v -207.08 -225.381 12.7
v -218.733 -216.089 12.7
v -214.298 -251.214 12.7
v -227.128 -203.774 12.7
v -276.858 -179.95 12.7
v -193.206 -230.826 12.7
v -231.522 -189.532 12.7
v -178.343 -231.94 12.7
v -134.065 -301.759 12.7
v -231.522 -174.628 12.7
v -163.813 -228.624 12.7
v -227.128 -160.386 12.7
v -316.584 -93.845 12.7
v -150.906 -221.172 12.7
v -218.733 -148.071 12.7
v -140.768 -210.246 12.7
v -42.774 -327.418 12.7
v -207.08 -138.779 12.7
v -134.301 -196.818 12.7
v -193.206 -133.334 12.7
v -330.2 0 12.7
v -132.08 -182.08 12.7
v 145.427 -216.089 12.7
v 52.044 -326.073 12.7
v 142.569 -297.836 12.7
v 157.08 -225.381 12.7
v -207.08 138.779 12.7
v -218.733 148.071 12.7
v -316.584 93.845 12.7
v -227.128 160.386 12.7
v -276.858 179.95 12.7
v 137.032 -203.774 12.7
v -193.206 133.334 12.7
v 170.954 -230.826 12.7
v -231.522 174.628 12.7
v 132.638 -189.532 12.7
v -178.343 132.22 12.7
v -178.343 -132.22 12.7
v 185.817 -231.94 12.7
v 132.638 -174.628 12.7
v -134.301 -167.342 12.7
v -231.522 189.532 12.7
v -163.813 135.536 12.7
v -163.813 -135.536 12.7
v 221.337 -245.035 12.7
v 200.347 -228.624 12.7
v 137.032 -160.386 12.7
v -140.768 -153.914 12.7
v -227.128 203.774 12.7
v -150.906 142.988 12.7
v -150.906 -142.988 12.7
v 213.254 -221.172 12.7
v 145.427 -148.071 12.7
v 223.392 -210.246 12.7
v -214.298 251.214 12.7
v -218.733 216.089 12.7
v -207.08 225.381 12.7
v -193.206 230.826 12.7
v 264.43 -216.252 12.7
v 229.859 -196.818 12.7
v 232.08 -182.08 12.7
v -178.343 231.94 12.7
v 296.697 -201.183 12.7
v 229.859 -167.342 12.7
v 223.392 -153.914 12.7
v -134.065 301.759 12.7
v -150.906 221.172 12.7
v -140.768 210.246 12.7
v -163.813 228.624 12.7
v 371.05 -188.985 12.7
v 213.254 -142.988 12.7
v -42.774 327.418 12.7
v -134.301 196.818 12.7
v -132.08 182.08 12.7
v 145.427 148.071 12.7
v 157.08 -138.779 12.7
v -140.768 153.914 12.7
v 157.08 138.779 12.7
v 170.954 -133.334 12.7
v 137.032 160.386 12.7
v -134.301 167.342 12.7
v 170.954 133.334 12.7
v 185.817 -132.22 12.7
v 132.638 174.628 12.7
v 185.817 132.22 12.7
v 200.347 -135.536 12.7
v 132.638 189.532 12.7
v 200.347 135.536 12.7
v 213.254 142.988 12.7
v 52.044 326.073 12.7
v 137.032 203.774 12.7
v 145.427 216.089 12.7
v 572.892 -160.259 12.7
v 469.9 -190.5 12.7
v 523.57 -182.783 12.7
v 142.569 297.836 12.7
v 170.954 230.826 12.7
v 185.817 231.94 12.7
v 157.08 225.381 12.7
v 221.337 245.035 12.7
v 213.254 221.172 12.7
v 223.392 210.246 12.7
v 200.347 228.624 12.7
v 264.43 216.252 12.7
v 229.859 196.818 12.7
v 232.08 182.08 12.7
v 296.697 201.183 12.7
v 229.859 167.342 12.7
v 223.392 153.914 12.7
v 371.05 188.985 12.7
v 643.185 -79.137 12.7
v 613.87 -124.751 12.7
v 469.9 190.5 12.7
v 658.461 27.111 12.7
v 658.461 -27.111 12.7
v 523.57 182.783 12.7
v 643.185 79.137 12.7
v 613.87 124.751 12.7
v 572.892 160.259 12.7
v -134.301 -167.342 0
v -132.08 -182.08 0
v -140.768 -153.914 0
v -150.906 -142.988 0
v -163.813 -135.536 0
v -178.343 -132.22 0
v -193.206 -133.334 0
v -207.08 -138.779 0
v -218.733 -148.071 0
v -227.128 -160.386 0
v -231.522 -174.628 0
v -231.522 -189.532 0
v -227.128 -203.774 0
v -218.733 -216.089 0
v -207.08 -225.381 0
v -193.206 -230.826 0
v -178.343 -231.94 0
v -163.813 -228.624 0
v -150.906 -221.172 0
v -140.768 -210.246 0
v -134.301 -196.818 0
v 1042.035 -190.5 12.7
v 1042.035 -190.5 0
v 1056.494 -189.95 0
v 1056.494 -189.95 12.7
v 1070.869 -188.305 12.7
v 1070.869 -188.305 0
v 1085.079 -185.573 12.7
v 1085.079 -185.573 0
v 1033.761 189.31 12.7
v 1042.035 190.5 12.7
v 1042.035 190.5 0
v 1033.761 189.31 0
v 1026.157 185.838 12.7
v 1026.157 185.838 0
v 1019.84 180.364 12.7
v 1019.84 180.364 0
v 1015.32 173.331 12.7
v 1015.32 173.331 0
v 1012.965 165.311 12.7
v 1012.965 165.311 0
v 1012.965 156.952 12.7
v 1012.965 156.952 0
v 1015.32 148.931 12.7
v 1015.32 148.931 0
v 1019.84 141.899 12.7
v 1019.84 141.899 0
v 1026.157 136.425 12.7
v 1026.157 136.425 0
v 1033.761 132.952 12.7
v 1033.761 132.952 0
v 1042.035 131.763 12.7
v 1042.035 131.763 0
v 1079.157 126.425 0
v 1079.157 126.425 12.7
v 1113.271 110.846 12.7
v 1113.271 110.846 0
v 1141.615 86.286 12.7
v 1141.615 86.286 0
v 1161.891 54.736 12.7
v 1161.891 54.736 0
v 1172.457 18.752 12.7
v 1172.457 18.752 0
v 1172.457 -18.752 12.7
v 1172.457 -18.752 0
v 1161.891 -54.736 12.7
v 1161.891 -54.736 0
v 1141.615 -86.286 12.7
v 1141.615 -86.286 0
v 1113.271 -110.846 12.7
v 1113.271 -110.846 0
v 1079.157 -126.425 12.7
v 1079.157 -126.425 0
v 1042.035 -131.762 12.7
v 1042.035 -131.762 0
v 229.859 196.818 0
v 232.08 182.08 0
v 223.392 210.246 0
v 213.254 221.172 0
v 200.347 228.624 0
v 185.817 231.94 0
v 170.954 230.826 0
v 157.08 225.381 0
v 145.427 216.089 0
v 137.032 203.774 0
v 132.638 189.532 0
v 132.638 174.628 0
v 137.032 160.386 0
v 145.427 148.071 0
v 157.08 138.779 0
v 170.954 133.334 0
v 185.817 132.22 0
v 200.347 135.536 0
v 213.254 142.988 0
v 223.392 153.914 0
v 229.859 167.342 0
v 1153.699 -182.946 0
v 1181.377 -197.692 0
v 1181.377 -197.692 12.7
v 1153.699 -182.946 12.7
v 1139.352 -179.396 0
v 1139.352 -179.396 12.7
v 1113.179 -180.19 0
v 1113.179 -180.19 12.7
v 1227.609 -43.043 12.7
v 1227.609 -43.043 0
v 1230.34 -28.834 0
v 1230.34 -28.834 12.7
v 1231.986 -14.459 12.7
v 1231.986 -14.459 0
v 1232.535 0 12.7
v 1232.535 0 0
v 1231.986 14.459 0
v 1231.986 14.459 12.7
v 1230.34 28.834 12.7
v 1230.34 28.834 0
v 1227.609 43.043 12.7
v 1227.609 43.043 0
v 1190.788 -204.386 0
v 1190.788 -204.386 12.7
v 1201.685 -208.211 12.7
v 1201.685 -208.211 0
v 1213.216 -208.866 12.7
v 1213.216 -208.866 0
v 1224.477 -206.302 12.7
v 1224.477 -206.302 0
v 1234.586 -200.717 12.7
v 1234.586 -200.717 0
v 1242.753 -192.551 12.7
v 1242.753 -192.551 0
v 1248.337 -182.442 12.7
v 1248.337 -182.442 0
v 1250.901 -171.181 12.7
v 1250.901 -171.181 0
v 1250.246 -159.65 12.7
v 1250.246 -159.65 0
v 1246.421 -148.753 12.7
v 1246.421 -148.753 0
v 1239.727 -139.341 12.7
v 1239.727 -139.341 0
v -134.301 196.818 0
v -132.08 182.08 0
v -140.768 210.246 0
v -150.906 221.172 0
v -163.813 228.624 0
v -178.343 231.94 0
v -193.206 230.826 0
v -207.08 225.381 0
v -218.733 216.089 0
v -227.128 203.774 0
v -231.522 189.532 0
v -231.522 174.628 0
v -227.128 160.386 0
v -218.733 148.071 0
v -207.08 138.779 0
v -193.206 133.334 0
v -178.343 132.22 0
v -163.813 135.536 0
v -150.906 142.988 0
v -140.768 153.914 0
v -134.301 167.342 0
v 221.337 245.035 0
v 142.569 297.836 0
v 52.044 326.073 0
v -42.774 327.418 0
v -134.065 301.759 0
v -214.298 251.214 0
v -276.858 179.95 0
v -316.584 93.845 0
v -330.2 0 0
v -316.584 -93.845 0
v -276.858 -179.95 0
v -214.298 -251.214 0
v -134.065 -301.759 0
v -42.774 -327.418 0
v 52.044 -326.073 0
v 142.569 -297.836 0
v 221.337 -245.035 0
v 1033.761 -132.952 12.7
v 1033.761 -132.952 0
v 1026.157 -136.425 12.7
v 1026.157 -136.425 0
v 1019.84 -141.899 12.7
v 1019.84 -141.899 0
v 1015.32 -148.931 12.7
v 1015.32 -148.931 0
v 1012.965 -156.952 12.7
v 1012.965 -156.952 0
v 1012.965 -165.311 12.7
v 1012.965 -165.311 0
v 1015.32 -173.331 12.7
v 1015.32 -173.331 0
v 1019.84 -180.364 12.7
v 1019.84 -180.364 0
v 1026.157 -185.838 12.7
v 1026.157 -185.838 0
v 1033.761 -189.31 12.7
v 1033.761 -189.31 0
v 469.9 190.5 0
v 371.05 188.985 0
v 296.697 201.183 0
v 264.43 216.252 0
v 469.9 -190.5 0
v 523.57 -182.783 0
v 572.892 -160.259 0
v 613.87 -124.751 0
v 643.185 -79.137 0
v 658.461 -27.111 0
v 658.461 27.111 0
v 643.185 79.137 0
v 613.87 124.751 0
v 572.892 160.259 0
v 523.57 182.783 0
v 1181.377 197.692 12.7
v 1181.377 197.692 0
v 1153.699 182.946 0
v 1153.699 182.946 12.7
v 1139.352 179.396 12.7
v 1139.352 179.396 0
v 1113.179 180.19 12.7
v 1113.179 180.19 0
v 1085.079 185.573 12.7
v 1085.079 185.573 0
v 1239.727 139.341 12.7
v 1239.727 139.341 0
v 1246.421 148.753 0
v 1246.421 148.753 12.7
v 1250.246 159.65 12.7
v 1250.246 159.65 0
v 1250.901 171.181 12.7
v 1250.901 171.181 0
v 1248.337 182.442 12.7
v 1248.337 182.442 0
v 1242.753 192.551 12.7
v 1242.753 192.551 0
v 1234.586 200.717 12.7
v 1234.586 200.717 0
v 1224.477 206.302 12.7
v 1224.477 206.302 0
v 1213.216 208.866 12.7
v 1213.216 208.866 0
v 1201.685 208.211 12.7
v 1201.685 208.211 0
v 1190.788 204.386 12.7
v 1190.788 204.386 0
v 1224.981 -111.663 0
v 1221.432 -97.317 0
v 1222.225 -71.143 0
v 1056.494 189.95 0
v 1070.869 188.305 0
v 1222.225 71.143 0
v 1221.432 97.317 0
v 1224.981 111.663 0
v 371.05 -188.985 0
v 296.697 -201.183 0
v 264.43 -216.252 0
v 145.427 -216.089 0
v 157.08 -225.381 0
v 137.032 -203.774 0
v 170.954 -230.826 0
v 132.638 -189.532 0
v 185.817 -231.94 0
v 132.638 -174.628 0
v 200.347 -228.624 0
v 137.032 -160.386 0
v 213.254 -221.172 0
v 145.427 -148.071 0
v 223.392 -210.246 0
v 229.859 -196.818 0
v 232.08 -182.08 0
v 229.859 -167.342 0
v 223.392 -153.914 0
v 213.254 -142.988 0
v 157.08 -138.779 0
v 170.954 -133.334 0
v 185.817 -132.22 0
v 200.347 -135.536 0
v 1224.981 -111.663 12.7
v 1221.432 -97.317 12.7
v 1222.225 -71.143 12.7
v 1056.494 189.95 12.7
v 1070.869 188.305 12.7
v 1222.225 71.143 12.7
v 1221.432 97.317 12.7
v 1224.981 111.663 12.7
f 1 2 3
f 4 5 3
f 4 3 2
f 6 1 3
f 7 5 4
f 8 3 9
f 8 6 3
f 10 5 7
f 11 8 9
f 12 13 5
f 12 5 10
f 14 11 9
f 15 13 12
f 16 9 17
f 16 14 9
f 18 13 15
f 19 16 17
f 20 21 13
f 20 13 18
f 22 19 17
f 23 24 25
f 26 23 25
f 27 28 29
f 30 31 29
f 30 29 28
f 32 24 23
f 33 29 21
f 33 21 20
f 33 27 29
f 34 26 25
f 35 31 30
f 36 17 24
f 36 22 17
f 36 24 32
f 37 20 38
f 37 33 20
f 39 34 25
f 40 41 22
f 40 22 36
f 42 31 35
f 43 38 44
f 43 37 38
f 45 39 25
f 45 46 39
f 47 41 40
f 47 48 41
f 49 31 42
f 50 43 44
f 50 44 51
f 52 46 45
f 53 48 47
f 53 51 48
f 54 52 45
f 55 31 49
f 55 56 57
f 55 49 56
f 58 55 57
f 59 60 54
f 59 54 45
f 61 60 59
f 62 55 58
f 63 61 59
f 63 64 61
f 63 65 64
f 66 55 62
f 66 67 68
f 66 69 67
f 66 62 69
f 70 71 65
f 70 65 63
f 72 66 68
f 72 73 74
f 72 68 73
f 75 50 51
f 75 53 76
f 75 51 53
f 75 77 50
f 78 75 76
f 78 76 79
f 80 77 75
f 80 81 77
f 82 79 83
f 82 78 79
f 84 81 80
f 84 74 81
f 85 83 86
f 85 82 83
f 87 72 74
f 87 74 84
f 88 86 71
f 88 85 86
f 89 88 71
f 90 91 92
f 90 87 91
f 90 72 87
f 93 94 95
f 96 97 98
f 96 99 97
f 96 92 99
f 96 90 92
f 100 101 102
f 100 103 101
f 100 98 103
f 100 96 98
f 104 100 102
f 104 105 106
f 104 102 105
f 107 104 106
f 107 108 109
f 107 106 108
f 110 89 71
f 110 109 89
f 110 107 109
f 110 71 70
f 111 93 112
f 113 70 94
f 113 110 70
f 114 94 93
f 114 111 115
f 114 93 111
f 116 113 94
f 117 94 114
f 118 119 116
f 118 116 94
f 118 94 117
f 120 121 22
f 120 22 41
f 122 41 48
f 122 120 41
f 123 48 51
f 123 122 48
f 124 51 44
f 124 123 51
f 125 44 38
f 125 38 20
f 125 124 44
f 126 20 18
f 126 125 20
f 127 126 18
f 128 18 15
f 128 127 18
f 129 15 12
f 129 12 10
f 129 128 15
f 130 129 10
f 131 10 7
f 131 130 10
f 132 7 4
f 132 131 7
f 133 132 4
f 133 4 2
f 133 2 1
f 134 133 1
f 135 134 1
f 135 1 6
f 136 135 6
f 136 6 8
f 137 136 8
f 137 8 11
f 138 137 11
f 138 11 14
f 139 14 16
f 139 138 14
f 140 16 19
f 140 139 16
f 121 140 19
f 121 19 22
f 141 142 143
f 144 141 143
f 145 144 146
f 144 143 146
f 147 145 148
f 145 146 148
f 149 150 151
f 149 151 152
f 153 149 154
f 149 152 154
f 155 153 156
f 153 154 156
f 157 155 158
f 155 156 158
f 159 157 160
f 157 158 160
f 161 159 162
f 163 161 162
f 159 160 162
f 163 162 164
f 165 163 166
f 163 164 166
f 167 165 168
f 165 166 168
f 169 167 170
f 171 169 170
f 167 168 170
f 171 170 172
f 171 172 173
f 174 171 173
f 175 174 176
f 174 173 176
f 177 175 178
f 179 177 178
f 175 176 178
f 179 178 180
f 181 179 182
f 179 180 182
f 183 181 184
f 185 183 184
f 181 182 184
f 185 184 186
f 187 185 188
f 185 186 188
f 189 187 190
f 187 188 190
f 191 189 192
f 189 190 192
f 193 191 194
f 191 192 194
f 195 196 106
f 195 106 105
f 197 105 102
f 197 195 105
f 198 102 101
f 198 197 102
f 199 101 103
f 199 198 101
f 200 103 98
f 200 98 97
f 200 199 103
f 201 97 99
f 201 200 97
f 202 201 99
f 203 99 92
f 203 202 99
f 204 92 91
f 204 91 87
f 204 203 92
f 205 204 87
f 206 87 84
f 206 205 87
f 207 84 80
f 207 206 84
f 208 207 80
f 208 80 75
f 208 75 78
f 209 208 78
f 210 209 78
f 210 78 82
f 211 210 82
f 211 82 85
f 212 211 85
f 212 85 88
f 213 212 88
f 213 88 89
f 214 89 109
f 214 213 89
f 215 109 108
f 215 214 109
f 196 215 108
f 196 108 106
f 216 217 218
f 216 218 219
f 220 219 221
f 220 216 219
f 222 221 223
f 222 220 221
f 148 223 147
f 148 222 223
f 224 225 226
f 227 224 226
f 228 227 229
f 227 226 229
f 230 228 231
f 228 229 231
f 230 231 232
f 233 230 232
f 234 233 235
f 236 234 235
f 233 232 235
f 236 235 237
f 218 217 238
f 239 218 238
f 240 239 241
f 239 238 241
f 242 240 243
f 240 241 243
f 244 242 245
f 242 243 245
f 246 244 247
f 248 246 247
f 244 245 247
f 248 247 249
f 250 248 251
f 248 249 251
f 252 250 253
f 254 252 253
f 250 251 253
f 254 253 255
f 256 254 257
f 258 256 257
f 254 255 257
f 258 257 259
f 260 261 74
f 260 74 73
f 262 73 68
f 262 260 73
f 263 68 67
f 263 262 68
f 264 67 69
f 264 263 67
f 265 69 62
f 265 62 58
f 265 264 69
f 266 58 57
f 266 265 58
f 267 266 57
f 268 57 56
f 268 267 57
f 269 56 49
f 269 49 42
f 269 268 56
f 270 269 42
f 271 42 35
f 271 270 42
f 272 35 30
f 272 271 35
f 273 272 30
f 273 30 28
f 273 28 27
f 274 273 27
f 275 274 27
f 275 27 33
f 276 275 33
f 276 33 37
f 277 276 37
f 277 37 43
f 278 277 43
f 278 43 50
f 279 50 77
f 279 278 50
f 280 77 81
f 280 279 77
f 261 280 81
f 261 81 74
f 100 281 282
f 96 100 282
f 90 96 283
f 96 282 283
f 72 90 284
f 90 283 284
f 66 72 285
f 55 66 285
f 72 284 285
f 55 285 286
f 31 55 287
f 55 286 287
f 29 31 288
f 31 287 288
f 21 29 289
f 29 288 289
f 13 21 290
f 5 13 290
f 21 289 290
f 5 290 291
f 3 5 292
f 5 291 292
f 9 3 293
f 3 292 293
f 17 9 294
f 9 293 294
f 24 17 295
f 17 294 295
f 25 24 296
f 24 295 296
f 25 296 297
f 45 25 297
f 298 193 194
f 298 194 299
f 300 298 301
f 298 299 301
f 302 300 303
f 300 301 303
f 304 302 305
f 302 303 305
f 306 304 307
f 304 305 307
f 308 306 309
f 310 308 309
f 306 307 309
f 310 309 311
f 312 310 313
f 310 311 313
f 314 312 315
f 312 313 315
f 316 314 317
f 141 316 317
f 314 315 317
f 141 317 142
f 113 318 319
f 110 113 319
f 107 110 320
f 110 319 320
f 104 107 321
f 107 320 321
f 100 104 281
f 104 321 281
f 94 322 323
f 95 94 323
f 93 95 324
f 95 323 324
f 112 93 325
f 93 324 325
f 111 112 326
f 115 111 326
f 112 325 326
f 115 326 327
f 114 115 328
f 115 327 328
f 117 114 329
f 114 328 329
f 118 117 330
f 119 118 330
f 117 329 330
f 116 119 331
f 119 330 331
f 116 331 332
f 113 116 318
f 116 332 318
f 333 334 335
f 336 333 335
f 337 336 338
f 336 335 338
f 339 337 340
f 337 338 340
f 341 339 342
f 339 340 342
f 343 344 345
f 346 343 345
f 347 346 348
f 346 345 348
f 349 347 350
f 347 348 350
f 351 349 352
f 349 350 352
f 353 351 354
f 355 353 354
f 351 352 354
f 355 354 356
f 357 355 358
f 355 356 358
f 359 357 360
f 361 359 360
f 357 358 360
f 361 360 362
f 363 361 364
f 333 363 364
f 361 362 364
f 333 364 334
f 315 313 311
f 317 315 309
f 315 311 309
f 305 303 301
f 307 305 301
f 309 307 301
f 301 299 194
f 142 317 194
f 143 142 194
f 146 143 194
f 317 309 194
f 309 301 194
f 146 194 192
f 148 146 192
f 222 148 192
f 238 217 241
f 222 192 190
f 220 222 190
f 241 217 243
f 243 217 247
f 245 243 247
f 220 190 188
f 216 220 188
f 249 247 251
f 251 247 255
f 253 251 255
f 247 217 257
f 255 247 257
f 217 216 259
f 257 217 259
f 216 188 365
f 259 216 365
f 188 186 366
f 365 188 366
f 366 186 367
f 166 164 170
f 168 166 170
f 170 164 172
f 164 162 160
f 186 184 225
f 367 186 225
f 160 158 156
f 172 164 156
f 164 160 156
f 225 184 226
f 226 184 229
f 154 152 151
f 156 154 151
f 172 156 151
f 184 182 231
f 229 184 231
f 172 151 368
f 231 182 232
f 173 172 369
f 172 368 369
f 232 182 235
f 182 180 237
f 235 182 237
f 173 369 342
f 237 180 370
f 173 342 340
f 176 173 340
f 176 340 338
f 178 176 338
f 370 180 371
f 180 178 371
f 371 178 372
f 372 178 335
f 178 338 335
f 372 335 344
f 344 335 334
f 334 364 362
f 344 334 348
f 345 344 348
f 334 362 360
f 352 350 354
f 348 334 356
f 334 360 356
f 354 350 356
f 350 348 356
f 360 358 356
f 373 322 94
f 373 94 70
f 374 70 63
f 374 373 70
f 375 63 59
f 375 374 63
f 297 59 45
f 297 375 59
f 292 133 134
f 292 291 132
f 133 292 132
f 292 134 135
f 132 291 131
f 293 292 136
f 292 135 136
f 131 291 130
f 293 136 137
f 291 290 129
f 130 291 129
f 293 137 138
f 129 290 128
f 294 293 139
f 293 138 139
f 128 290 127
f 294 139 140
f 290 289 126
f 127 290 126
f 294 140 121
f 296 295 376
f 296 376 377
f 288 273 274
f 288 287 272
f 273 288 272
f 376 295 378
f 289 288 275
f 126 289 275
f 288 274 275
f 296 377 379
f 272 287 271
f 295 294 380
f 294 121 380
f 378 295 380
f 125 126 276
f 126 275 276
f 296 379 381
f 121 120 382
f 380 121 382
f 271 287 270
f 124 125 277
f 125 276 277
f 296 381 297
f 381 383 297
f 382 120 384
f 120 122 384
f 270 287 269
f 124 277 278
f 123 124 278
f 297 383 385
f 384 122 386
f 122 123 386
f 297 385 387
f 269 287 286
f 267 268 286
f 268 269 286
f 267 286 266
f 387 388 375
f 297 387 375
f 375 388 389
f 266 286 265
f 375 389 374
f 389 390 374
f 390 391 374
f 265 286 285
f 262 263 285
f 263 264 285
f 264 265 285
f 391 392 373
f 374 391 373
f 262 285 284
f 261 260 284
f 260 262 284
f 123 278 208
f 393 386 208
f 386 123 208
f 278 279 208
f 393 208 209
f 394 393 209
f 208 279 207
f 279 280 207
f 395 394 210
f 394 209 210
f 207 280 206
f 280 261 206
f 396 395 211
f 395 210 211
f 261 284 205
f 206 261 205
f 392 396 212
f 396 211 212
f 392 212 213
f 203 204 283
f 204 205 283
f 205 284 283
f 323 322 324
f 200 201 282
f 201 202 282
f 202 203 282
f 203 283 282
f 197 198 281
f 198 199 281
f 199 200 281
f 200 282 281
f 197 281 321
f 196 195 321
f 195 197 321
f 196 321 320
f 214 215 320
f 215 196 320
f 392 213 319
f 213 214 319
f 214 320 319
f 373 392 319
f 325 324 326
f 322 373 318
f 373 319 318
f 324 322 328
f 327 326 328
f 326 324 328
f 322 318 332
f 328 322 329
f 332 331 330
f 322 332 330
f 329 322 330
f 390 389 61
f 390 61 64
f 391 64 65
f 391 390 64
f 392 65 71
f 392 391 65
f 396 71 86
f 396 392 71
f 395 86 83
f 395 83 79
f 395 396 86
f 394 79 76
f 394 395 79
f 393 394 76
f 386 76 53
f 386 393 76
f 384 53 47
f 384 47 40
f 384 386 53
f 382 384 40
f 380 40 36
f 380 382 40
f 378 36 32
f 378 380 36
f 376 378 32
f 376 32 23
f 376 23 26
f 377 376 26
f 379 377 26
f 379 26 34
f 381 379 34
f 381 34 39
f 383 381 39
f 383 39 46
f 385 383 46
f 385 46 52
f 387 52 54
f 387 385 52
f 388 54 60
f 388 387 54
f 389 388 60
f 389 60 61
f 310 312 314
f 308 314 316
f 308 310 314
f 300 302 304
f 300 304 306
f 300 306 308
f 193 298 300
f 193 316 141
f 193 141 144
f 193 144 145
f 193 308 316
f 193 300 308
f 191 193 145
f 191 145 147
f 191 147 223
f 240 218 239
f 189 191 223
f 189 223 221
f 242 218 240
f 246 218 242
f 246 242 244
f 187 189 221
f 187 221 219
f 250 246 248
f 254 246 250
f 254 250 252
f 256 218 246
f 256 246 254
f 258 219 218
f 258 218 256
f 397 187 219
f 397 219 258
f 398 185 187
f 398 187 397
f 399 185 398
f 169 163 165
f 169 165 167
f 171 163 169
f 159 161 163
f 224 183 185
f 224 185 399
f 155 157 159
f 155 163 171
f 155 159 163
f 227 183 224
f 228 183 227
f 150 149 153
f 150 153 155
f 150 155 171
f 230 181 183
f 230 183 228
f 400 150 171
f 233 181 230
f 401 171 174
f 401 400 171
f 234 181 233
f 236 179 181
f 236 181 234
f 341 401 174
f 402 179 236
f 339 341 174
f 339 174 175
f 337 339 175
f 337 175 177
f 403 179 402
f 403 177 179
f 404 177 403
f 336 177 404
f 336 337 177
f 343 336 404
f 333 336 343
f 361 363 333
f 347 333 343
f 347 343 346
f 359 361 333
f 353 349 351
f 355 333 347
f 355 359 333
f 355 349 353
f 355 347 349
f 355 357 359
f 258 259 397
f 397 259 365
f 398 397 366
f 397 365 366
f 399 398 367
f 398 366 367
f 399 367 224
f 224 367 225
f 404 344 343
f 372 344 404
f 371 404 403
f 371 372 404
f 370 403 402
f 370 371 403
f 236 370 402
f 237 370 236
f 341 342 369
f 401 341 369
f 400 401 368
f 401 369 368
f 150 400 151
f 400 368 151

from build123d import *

# Parameters (mm, degrees)
F0_R     = 50
F1_DEPTH = 12.7


with BuildPart() as f1:
    # F0 (on Top) → F1 (new body)
    with BuildSketch(Plane.XY):
        with BuildLine():
            add(Edge.make_bspline(
                [(469.9, 190.5), (414.7021226199, 185.0982024329), (312.1123093023, 190.3979484167), (270.2493008939, 209.791310107), (221.3368791864, 245.0347442956)],
                knots=[0, 0, 0, 0, 0.5331164092, 1, 1, 1, 1], degree=3))
            ThreePointArc((221.3368791864, 245.0347442956), (-330.2, 0), (221.3368791864, -245.0347442956))
            add(Edge.make_bspline(
                [(469.9, -190.5), (414.7021226199, -185.0982024329), (312.1123093023, -190.3979484167), (270.2493008939, -209.791310107), (221.3368791864, -245.0347442956)],
                knots=[0, 0, 0, 0, 0.5331164092, 1, 1, 1, 1], degree=3))
            ThreePointArc((469.9, -190.5), (660.4, 0), (469.9, 190.5))
        make_face()
        with Locations((-182.0799961555, -182.0799961555)):
            Circle(F0_R, mode=Mode.SUBTRACT)
        with Locations((182.0799961555, -182.0799961555)):
            Circle(F0_R, mode=Mode.SUBTRACT)
        with Locations((-182.0799961555, 182.0799961555)):
            Circle(F0_R, mode=Mode.SUBTRACT)
        with Locations((182.0799961555, 182.0799961555)):
            Circle(F0_R, mode=Mode.SUBTRACT)
    extrude(amount=F1_DEPTH)


with BuildPart() as f1b:
    # F0 (on Top) → F1, piece 2 (new body)
    with BuildSketch(Plane.XY):
        with BuildLine():
            add(Edge.make_bspline(
                [(1181.3766119803, 197.6921478188), (1168.8379561315, 189.8339139976), (1141.8774811611, 173.1941766754), (1104.8288574492, 181.3313279996), (1085.0785449809, 185.573491397)],
                knots=[0, 0, 0, 0, 0.4681351674, 1, 1, 1, 1], degree=3))
            ThreePointArc((1085.0785449809, 185.573491397), (1063.6973807185, 189.2643655197), (1042.0352029786, 190.5))
            ThreePointArc((1042.0352029786, 190.5), (1012.6664529786, 161.13125), (1042.0352029786, 131.7625))
            ThreePointArc((1042.0352029786, 131.7625), (1135.2053602347, 93.1701572561), (1173.7977029786, 0))
            ThreePointArc((1173.7977029786, 0), (1135.2053602347, -93.1701572561), (1042.0352029786, -131.7625))
            ThreePointArc((1042.0352029786, -131.7625), (1012.6664529786, -161.13125), (1042.0352029786, -190.5))
            ThreePointArc((1042.0352029786, -190.5), (1063.6973807185, -189.2643655197), (1085.0785449809, -185.573491397))
            add(Edge.make_bspline(
                [(1181.3766119803, -197.6921478188), (1168.8379561315, -189.8339139976), (1141.8774811611, -173.1941766754), (1104.8288574492, -181.3313279996), (1085.0785449809, -185.573491397)],
                knots=[0, 0, 0, 0, 0.4681351674, 1, 1, 1, 1], degree=3))
            ThreePointArc((1181.3766119803, -197.6921478188), (1238.9563840838, -196.9211811052), (1239.7273507974, -139.3414090017))
            add(Edge.make_bspline(
                [(1239.7273507974, -139.3414090017), (1231.8691169762, -126.8027531529), (1215.229379654, -99.8422781825), (1223.3665309782, -62.7936544706), (1227.6086943756, -43.0433420023)],
                knots=[0, 0, 0, 0, 0.4681351674, 1, 1, 1, 1], degree=3))
            ThreePointArc((1227.6086943756, -43.0433420023), (1231.2995684983, -21.6621777399), (1232.5352029786, 0))
            ThreePointArc((1232.5352029786, 0), (1231.2995684983, 21.6621777399), (1227.6086943756, 43.0433420023))
            add(Edge.make_bspline(
                [(1239.7273507974, 139.3414090017), (1231.8691169762, 126.8027531529), (1215.229379654, 99.8422781825), (1223.3665309782, 62.7936544706), (1227.6086943756, 43.0433420023)],
                knots=[0, 0, 0, 0, 0.4681351674, 1, 1, 1, 1], degree=3))
            ThreePointArc((1239.7273507974, 139.3414090017), (1238.9563840838, 196.9211811052), (1181.3766119803, 197.6921478188))
        make_face()
    extrude(amount=F1_DEPTH)


solid = Compound([f1.part, f1b.part])
